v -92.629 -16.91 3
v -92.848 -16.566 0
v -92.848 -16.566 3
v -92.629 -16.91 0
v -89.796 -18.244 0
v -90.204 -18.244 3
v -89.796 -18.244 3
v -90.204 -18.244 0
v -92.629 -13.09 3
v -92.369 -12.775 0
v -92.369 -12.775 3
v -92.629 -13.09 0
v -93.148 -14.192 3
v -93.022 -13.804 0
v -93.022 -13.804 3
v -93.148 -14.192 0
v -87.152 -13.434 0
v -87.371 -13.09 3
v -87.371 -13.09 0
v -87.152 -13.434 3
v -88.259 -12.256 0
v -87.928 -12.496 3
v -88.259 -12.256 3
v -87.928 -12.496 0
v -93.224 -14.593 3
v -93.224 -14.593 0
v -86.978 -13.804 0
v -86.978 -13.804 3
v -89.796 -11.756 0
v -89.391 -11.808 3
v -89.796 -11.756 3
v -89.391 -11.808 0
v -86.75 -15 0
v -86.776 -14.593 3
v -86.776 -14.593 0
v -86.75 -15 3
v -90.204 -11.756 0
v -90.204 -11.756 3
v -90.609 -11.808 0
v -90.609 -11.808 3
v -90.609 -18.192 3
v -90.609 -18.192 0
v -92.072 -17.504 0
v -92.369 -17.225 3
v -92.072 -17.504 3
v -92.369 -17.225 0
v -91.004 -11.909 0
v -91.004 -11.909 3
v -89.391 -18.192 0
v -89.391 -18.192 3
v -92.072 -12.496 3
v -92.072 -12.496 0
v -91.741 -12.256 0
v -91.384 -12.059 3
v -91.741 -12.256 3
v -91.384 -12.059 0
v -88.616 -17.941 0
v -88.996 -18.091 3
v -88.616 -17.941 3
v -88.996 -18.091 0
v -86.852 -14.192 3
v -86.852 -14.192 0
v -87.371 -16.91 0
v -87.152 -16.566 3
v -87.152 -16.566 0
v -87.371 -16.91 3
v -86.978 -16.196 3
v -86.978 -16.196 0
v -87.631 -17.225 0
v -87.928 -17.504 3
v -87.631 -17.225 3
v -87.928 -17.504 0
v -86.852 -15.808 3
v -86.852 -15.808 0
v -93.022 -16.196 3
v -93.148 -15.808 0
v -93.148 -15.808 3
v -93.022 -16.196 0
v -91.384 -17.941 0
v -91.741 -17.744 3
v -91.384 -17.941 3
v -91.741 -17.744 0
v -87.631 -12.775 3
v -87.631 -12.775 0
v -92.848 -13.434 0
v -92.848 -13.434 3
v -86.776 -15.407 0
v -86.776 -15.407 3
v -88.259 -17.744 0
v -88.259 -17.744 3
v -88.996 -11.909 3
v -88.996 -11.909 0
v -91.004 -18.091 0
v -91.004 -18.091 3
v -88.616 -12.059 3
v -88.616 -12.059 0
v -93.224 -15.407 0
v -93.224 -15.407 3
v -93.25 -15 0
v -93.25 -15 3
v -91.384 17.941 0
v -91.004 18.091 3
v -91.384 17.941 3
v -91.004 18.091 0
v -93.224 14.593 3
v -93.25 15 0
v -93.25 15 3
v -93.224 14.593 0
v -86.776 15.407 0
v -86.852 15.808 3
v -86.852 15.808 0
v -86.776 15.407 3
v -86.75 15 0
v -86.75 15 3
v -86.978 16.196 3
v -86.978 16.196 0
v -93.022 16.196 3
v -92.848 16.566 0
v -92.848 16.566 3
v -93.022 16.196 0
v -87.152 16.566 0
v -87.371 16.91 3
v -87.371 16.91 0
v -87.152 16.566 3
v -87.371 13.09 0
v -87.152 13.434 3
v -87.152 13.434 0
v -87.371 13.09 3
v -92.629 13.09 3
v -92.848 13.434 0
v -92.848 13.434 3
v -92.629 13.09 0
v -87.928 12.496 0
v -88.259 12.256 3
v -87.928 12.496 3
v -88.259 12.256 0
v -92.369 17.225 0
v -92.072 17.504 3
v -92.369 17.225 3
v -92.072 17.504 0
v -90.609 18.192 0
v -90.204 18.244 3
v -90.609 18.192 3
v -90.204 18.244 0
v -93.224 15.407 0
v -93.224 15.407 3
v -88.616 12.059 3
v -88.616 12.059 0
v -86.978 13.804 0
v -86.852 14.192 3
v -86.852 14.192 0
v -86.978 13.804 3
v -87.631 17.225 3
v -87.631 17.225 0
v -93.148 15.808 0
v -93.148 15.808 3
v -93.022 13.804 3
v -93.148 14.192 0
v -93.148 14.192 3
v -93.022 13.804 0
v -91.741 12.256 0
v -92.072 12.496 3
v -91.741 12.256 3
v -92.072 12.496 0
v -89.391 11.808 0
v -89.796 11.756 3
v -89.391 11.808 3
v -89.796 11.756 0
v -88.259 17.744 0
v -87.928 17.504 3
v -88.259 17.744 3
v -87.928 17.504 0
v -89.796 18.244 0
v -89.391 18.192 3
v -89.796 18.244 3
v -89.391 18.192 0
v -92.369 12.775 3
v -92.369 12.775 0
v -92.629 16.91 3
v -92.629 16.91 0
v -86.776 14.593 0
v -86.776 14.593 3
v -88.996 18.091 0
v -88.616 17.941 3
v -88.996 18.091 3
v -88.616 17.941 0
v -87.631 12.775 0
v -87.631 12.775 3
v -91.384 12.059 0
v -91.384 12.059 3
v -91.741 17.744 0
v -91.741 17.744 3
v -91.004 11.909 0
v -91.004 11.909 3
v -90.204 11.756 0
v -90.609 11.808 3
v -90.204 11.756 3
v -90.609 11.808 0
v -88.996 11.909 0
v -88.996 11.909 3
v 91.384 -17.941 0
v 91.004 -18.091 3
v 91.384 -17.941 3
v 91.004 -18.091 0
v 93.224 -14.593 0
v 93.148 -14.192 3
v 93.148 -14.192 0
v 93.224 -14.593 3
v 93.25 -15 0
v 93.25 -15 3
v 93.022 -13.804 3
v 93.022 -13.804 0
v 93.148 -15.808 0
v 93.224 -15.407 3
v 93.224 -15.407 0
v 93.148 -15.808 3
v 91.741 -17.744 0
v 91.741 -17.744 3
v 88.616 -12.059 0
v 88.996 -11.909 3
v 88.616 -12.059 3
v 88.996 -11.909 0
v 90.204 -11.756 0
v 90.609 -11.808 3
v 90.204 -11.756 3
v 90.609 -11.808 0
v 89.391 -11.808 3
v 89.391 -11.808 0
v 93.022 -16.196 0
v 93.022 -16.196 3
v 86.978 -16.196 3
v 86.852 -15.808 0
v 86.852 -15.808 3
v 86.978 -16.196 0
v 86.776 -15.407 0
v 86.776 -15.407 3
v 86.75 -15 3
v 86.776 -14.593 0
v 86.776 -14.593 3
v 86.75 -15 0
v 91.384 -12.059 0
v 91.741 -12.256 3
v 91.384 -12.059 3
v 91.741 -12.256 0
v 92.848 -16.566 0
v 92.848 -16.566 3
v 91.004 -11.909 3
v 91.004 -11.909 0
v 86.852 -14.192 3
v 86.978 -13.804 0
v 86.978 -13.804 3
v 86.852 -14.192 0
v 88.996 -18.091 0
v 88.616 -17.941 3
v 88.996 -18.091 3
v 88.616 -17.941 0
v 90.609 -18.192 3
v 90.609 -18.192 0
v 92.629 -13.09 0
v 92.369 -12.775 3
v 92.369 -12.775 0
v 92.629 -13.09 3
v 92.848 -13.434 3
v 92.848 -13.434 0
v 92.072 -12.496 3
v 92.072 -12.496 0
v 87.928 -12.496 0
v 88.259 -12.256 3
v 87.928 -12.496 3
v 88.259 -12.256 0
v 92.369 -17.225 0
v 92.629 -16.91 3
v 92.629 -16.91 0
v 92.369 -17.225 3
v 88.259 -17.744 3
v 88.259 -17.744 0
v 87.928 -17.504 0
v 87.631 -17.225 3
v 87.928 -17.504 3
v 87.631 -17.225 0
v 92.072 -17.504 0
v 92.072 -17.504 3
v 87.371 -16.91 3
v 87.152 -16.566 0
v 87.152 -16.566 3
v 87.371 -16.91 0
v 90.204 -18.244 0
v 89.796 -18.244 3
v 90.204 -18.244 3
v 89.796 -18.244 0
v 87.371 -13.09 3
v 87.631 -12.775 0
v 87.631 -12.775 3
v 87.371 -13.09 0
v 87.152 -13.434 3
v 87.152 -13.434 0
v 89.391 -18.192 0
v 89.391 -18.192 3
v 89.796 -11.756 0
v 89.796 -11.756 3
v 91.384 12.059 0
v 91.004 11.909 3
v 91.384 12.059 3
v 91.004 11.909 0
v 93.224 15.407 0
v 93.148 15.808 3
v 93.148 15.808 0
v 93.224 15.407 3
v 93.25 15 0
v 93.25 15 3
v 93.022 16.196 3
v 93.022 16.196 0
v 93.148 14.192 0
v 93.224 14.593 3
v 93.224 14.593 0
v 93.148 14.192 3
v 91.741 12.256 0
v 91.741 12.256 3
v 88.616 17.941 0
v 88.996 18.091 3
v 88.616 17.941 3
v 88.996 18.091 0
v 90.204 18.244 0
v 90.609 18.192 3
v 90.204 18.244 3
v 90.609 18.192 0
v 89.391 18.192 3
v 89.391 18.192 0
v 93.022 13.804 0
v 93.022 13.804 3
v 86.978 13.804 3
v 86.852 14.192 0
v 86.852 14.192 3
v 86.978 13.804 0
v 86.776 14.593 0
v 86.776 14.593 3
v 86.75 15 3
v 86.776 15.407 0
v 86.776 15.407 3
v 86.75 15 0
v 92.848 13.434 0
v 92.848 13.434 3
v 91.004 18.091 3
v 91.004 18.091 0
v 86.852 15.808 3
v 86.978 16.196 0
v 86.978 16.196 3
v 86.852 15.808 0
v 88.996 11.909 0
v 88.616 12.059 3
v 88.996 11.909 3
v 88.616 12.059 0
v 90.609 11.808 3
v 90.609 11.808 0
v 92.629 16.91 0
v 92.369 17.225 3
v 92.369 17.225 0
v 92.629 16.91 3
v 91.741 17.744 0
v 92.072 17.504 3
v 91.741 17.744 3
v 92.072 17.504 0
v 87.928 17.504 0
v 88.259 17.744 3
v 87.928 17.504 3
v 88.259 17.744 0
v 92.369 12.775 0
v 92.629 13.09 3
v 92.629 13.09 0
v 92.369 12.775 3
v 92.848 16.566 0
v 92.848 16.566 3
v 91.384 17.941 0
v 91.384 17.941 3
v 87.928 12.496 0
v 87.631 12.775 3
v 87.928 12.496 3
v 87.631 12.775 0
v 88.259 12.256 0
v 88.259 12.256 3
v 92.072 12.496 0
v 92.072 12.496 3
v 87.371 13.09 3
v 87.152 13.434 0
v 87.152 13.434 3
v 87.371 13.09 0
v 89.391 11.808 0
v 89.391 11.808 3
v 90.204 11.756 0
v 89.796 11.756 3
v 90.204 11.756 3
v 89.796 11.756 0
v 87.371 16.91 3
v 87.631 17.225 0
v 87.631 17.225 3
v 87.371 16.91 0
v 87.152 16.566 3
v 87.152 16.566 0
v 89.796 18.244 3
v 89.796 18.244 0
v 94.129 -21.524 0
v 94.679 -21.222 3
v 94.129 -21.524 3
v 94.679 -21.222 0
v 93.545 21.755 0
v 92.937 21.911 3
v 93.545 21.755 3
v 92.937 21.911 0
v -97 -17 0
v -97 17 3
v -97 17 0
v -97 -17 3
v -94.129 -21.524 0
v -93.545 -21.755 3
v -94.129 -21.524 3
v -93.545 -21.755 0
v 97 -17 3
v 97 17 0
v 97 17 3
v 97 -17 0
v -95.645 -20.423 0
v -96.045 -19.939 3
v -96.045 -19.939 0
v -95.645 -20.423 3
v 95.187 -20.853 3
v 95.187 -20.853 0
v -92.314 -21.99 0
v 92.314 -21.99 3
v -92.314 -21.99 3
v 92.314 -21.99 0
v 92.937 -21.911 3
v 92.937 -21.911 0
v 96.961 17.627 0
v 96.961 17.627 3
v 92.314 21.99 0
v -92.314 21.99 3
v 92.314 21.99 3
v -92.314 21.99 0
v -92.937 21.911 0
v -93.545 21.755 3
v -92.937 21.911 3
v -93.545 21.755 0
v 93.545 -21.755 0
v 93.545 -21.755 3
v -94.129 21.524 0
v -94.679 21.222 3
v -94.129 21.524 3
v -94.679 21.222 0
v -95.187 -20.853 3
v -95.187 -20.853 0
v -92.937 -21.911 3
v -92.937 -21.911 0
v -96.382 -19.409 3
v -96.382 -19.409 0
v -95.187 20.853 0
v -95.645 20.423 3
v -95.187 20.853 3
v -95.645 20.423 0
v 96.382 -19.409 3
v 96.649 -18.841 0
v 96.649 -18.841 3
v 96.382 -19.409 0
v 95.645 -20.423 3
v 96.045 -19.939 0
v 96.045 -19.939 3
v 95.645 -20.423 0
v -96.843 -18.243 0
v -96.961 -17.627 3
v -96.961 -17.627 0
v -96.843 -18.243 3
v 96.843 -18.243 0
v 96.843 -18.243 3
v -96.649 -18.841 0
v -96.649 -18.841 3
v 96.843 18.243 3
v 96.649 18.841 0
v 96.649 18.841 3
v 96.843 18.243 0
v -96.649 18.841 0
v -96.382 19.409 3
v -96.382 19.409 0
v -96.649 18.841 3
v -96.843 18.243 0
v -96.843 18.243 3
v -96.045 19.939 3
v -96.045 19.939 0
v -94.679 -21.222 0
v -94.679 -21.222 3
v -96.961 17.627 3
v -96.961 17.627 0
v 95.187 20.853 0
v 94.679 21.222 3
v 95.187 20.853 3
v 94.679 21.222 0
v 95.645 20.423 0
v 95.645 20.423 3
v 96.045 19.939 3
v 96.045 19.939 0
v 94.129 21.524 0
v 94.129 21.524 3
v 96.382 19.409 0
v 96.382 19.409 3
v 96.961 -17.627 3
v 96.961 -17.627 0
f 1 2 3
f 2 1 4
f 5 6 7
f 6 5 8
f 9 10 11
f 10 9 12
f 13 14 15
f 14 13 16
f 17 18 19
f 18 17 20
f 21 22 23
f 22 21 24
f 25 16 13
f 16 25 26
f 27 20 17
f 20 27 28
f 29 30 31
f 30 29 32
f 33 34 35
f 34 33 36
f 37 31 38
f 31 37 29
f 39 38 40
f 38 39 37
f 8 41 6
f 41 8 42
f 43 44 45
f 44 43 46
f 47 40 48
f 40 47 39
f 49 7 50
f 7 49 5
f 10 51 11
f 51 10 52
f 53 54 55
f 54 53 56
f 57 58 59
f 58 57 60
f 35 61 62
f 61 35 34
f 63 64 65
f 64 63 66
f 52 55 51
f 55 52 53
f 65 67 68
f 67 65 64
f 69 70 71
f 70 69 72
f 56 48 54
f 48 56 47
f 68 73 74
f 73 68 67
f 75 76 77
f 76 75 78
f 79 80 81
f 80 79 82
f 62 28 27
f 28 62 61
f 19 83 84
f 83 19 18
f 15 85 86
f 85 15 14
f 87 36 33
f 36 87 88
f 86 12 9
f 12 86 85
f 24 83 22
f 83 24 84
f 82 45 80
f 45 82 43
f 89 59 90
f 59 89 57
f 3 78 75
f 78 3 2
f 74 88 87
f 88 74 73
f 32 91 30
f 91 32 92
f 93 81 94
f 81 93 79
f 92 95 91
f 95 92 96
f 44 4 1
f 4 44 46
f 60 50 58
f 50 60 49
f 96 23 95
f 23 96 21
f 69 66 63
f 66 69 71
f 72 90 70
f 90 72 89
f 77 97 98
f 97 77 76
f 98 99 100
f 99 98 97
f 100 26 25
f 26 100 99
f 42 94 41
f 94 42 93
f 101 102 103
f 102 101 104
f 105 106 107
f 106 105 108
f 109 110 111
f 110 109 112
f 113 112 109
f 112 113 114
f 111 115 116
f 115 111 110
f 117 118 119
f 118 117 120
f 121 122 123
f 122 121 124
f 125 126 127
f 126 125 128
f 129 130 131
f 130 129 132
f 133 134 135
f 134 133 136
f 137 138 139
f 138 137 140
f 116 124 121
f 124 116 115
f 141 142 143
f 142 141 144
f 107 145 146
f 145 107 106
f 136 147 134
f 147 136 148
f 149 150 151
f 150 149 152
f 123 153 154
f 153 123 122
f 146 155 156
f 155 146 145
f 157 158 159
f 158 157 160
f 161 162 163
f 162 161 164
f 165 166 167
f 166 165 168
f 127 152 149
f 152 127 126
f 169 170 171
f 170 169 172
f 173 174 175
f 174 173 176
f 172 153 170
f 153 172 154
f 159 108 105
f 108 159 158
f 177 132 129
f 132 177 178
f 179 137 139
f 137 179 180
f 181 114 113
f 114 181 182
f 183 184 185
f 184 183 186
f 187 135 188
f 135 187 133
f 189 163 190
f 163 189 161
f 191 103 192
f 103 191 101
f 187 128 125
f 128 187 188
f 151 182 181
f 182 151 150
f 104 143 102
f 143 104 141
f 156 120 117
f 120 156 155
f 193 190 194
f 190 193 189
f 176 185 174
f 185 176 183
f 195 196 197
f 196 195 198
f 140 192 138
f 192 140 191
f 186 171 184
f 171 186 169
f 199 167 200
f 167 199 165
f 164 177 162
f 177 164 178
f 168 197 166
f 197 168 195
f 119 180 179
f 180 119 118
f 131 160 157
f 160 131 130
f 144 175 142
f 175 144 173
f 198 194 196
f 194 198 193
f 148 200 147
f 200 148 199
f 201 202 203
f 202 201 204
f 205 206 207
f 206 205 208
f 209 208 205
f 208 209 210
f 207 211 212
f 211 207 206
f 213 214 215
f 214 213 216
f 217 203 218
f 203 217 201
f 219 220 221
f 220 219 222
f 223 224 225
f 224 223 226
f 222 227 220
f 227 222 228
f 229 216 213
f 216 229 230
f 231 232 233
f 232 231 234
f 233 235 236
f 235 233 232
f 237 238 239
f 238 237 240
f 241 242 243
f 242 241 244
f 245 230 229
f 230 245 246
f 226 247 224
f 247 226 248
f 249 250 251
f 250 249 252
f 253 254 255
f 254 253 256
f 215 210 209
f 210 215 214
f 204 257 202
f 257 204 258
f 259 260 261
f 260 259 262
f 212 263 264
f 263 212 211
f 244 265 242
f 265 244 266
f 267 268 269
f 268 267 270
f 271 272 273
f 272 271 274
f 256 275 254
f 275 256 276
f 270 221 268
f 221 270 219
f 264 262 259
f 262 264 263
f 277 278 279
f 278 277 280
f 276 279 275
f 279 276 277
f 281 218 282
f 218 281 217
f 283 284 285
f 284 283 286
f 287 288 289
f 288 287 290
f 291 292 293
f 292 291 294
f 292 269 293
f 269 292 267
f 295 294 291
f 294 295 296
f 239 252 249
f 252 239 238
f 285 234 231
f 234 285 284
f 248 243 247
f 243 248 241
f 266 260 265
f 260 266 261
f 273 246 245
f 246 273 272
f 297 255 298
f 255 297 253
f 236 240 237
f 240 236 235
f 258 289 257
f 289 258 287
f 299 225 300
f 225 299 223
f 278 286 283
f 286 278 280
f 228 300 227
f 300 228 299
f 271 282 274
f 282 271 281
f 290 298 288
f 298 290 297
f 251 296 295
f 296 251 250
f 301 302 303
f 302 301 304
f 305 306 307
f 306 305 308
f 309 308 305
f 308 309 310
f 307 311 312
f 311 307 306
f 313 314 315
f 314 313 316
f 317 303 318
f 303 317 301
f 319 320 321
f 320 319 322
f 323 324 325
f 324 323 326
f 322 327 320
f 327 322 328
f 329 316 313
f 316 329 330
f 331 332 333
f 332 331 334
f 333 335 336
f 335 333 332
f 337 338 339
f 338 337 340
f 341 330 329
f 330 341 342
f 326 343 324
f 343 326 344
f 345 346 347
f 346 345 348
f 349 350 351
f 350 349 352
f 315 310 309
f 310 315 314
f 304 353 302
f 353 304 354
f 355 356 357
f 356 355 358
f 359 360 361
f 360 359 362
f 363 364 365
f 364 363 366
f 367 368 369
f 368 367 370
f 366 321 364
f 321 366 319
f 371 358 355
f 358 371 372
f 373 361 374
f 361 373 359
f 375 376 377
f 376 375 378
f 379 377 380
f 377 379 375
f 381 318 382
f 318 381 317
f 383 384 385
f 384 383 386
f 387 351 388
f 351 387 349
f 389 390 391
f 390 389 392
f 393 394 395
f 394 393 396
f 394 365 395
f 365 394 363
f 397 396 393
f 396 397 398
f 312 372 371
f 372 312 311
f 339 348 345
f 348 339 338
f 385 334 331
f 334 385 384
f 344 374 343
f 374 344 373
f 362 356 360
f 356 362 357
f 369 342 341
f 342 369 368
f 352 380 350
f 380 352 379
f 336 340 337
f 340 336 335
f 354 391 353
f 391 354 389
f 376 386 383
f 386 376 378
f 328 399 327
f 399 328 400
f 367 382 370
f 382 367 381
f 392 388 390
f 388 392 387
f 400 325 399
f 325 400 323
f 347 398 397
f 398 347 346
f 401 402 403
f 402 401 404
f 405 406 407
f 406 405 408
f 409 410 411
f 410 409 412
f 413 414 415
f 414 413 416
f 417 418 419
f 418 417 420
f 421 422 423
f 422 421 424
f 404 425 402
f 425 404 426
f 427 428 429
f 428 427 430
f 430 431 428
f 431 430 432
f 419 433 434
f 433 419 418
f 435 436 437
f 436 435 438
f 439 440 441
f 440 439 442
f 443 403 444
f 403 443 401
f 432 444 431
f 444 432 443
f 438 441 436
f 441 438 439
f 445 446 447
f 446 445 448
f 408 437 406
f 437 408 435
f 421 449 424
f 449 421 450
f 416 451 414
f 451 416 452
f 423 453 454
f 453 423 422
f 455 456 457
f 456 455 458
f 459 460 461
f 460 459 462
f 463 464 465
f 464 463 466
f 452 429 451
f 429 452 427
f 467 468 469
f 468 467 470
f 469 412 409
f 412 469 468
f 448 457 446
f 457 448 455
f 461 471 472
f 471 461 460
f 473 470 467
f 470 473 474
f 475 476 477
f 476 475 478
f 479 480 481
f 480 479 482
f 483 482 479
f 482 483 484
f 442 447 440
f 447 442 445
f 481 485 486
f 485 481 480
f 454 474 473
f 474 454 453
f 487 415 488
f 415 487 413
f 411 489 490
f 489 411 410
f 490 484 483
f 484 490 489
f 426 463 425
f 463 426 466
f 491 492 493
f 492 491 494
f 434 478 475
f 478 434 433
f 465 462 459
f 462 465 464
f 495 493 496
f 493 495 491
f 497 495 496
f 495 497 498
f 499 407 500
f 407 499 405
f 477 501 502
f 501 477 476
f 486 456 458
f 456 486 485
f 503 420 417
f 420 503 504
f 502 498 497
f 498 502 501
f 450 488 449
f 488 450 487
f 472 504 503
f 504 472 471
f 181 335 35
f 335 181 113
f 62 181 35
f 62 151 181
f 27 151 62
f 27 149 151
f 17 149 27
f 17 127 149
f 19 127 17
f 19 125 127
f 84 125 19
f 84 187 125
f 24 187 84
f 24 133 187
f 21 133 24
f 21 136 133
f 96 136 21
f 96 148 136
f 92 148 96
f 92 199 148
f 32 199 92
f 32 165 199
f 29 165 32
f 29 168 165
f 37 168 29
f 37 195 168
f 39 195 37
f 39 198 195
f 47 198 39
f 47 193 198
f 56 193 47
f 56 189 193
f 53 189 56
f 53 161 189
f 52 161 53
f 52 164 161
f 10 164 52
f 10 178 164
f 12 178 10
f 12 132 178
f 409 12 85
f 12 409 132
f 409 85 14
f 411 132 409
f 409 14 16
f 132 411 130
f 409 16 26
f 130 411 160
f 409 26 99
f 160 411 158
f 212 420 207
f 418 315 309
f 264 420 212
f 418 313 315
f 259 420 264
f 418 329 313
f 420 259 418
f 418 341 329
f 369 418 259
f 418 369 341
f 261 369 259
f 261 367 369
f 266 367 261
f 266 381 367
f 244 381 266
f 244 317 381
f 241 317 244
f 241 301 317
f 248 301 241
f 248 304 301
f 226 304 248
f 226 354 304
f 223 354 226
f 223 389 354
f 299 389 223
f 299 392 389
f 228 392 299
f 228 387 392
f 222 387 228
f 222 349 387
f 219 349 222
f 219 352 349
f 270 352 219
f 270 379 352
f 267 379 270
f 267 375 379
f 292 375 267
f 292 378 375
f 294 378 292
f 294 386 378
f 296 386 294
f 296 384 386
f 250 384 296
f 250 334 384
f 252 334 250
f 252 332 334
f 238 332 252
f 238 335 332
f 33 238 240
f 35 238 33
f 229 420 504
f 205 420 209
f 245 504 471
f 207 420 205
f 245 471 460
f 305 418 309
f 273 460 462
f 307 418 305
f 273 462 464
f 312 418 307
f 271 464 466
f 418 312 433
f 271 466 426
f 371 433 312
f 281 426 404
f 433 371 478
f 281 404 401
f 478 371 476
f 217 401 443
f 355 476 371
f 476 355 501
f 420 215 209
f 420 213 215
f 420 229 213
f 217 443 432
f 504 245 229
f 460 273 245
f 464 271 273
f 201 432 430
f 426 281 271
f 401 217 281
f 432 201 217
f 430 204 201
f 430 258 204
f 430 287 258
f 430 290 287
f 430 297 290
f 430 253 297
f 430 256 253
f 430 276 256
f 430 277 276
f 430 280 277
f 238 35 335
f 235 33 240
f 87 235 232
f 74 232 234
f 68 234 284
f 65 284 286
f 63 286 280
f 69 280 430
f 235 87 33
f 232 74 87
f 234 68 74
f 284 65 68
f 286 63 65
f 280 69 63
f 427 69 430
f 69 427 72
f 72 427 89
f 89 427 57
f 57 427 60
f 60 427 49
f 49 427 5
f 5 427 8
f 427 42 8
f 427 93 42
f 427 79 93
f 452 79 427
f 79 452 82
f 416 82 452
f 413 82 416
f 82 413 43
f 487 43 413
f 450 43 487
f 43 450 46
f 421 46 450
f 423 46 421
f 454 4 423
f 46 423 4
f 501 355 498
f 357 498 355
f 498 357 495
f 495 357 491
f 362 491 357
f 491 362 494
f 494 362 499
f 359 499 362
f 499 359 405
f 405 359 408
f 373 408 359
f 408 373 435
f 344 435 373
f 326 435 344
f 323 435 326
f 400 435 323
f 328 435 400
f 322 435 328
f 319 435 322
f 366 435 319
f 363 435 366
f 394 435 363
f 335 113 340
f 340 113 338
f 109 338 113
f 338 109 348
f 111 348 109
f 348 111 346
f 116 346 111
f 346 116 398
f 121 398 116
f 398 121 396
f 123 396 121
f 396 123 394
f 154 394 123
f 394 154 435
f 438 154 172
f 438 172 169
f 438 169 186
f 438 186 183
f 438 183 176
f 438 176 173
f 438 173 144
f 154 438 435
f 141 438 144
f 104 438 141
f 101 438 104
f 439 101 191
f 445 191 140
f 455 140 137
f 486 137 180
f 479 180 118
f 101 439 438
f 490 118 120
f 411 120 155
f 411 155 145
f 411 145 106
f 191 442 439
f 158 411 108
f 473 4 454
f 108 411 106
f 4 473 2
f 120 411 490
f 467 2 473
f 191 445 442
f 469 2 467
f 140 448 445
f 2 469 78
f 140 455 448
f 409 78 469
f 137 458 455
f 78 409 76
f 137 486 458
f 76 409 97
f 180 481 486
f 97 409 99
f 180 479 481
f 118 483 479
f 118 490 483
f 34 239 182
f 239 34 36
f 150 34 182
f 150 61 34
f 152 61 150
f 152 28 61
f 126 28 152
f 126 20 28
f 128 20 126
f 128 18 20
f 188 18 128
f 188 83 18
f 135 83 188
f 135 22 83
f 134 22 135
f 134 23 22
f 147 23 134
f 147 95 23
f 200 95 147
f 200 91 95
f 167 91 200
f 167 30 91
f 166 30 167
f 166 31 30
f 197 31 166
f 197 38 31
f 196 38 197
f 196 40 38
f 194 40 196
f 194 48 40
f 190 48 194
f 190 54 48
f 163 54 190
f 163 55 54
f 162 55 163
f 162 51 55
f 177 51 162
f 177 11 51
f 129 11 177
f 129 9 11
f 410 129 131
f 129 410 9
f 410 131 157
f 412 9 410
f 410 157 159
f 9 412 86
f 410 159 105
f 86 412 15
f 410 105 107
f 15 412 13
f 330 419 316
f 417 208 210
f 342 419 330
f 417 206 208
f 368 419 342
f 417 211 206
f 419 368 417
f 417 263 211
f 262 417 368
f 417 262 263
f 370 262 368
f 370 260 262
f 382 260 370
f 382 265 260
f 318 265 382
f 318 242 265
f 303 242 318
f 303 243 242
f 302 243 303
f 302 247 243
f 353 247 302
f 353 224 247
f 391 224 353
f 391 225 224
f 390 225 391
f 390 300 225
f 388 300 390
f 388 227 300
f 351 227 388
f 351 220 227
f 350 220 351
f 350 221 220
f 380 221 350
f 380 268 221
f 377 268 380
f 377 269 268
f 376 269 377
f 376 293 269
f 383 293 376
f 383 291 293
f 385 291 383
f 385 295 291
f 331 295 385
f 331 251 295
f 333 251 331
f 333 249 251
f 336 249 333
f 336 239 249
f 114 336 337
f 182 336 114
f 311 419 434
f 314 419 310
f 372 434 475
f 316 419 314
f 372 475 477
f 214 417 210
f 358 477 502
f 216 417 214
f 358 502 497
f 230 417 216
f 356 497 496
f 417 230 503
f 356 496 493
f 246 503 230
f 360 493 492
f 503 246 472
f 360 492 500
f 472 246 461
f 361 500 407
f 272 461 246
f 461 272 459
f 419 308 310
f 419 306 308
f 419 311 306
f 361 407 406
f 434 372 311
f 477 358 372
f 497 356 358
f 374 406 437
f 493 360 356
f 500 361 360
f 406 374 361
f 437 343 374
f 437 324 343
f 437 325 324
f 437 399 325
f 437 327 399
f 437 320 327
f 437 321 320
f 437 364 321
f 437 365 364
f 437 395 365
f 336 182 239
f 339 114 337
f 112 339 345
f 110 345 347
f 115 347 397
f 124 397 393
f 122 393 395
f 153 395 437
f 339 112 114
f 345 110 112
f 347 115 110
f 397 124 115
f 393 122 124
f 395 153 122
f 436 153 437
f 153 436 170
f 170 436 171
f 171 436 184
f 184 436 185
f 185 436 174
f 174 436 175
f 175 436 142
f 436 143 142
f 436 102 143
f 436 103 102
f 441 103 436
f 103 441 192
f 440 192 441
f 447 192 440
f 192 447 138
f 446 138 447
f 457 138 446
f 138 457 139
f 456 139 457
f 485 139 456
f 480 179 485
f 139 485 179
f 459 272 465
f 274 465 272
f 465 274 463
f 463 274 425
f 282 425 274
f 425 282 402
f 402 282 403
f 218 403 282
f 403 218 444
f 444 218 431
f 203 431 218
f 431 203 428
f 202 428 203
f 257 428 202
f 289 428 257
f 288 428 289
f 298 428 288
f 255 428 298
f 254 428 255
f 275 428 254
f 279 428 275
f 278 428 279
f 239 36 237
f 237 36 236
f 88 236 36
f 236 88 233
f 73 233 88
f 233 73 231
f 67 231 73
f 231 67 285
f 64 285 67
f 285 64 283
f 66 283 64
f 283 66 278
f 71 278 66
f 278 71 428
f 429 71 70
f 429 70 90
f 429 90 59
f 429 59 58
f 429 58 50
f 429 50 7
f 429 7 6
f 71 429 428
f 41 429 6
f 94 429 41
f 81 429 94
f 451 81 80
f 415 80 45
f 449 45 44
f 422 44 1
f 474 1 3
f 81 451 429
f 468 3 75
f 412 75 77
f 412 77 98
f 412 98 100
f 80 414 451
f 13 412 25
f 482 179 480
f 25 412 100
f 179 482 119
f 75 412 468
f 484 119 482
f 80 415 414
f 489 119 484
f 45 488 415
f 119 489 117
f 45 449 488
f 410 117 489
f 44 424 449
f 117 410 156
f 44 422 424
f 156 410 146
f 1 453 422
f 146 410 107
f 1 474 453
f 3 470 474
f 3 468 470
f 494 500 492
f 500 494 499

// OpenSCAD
$fn = 50;


difference() {
	union() {
		hull() {
			translate(v = [-92.0000000000, 17.0000000000, 0]) {
				cylinder(h = 3, r = 5);
			}
			translate(v = [92.0000000000, 17.0000000000, 0]) {
				cylinder(h = 3, r = 5);
			}
			translate(v = [-92.0000000000, -17.0000000000, 0]) {
				cylinder(h = 3, r = 5);
			}
			translate(v = [92.0000000000, -17.0000000000, 0]) {
				cylinder(h = 3, r = 5);
			}
		}
	}
	union() {
		translate(v = [-90.0000000000, -15.0000000000, -100.0000000000]) {
			cylinder(h = 200, r = 3.2500000000);
		}
		translate(v = [-90.0000000000, 15.0000000000, -100.0000000000]) {
			cylinder(h = 200, r = 3.2500000000);
		}
		translate(v = [90.0000000000, -15.0000000000, -100.0000000000]) {
			cylinder(h = 200, r = 3.2500000000);
		}
		translate(v = [90.0000000000, 15.0000000000, -100.0000000000]) {
			cylinder(h = 200, r = 3.2500000000);
		}
	}
}
